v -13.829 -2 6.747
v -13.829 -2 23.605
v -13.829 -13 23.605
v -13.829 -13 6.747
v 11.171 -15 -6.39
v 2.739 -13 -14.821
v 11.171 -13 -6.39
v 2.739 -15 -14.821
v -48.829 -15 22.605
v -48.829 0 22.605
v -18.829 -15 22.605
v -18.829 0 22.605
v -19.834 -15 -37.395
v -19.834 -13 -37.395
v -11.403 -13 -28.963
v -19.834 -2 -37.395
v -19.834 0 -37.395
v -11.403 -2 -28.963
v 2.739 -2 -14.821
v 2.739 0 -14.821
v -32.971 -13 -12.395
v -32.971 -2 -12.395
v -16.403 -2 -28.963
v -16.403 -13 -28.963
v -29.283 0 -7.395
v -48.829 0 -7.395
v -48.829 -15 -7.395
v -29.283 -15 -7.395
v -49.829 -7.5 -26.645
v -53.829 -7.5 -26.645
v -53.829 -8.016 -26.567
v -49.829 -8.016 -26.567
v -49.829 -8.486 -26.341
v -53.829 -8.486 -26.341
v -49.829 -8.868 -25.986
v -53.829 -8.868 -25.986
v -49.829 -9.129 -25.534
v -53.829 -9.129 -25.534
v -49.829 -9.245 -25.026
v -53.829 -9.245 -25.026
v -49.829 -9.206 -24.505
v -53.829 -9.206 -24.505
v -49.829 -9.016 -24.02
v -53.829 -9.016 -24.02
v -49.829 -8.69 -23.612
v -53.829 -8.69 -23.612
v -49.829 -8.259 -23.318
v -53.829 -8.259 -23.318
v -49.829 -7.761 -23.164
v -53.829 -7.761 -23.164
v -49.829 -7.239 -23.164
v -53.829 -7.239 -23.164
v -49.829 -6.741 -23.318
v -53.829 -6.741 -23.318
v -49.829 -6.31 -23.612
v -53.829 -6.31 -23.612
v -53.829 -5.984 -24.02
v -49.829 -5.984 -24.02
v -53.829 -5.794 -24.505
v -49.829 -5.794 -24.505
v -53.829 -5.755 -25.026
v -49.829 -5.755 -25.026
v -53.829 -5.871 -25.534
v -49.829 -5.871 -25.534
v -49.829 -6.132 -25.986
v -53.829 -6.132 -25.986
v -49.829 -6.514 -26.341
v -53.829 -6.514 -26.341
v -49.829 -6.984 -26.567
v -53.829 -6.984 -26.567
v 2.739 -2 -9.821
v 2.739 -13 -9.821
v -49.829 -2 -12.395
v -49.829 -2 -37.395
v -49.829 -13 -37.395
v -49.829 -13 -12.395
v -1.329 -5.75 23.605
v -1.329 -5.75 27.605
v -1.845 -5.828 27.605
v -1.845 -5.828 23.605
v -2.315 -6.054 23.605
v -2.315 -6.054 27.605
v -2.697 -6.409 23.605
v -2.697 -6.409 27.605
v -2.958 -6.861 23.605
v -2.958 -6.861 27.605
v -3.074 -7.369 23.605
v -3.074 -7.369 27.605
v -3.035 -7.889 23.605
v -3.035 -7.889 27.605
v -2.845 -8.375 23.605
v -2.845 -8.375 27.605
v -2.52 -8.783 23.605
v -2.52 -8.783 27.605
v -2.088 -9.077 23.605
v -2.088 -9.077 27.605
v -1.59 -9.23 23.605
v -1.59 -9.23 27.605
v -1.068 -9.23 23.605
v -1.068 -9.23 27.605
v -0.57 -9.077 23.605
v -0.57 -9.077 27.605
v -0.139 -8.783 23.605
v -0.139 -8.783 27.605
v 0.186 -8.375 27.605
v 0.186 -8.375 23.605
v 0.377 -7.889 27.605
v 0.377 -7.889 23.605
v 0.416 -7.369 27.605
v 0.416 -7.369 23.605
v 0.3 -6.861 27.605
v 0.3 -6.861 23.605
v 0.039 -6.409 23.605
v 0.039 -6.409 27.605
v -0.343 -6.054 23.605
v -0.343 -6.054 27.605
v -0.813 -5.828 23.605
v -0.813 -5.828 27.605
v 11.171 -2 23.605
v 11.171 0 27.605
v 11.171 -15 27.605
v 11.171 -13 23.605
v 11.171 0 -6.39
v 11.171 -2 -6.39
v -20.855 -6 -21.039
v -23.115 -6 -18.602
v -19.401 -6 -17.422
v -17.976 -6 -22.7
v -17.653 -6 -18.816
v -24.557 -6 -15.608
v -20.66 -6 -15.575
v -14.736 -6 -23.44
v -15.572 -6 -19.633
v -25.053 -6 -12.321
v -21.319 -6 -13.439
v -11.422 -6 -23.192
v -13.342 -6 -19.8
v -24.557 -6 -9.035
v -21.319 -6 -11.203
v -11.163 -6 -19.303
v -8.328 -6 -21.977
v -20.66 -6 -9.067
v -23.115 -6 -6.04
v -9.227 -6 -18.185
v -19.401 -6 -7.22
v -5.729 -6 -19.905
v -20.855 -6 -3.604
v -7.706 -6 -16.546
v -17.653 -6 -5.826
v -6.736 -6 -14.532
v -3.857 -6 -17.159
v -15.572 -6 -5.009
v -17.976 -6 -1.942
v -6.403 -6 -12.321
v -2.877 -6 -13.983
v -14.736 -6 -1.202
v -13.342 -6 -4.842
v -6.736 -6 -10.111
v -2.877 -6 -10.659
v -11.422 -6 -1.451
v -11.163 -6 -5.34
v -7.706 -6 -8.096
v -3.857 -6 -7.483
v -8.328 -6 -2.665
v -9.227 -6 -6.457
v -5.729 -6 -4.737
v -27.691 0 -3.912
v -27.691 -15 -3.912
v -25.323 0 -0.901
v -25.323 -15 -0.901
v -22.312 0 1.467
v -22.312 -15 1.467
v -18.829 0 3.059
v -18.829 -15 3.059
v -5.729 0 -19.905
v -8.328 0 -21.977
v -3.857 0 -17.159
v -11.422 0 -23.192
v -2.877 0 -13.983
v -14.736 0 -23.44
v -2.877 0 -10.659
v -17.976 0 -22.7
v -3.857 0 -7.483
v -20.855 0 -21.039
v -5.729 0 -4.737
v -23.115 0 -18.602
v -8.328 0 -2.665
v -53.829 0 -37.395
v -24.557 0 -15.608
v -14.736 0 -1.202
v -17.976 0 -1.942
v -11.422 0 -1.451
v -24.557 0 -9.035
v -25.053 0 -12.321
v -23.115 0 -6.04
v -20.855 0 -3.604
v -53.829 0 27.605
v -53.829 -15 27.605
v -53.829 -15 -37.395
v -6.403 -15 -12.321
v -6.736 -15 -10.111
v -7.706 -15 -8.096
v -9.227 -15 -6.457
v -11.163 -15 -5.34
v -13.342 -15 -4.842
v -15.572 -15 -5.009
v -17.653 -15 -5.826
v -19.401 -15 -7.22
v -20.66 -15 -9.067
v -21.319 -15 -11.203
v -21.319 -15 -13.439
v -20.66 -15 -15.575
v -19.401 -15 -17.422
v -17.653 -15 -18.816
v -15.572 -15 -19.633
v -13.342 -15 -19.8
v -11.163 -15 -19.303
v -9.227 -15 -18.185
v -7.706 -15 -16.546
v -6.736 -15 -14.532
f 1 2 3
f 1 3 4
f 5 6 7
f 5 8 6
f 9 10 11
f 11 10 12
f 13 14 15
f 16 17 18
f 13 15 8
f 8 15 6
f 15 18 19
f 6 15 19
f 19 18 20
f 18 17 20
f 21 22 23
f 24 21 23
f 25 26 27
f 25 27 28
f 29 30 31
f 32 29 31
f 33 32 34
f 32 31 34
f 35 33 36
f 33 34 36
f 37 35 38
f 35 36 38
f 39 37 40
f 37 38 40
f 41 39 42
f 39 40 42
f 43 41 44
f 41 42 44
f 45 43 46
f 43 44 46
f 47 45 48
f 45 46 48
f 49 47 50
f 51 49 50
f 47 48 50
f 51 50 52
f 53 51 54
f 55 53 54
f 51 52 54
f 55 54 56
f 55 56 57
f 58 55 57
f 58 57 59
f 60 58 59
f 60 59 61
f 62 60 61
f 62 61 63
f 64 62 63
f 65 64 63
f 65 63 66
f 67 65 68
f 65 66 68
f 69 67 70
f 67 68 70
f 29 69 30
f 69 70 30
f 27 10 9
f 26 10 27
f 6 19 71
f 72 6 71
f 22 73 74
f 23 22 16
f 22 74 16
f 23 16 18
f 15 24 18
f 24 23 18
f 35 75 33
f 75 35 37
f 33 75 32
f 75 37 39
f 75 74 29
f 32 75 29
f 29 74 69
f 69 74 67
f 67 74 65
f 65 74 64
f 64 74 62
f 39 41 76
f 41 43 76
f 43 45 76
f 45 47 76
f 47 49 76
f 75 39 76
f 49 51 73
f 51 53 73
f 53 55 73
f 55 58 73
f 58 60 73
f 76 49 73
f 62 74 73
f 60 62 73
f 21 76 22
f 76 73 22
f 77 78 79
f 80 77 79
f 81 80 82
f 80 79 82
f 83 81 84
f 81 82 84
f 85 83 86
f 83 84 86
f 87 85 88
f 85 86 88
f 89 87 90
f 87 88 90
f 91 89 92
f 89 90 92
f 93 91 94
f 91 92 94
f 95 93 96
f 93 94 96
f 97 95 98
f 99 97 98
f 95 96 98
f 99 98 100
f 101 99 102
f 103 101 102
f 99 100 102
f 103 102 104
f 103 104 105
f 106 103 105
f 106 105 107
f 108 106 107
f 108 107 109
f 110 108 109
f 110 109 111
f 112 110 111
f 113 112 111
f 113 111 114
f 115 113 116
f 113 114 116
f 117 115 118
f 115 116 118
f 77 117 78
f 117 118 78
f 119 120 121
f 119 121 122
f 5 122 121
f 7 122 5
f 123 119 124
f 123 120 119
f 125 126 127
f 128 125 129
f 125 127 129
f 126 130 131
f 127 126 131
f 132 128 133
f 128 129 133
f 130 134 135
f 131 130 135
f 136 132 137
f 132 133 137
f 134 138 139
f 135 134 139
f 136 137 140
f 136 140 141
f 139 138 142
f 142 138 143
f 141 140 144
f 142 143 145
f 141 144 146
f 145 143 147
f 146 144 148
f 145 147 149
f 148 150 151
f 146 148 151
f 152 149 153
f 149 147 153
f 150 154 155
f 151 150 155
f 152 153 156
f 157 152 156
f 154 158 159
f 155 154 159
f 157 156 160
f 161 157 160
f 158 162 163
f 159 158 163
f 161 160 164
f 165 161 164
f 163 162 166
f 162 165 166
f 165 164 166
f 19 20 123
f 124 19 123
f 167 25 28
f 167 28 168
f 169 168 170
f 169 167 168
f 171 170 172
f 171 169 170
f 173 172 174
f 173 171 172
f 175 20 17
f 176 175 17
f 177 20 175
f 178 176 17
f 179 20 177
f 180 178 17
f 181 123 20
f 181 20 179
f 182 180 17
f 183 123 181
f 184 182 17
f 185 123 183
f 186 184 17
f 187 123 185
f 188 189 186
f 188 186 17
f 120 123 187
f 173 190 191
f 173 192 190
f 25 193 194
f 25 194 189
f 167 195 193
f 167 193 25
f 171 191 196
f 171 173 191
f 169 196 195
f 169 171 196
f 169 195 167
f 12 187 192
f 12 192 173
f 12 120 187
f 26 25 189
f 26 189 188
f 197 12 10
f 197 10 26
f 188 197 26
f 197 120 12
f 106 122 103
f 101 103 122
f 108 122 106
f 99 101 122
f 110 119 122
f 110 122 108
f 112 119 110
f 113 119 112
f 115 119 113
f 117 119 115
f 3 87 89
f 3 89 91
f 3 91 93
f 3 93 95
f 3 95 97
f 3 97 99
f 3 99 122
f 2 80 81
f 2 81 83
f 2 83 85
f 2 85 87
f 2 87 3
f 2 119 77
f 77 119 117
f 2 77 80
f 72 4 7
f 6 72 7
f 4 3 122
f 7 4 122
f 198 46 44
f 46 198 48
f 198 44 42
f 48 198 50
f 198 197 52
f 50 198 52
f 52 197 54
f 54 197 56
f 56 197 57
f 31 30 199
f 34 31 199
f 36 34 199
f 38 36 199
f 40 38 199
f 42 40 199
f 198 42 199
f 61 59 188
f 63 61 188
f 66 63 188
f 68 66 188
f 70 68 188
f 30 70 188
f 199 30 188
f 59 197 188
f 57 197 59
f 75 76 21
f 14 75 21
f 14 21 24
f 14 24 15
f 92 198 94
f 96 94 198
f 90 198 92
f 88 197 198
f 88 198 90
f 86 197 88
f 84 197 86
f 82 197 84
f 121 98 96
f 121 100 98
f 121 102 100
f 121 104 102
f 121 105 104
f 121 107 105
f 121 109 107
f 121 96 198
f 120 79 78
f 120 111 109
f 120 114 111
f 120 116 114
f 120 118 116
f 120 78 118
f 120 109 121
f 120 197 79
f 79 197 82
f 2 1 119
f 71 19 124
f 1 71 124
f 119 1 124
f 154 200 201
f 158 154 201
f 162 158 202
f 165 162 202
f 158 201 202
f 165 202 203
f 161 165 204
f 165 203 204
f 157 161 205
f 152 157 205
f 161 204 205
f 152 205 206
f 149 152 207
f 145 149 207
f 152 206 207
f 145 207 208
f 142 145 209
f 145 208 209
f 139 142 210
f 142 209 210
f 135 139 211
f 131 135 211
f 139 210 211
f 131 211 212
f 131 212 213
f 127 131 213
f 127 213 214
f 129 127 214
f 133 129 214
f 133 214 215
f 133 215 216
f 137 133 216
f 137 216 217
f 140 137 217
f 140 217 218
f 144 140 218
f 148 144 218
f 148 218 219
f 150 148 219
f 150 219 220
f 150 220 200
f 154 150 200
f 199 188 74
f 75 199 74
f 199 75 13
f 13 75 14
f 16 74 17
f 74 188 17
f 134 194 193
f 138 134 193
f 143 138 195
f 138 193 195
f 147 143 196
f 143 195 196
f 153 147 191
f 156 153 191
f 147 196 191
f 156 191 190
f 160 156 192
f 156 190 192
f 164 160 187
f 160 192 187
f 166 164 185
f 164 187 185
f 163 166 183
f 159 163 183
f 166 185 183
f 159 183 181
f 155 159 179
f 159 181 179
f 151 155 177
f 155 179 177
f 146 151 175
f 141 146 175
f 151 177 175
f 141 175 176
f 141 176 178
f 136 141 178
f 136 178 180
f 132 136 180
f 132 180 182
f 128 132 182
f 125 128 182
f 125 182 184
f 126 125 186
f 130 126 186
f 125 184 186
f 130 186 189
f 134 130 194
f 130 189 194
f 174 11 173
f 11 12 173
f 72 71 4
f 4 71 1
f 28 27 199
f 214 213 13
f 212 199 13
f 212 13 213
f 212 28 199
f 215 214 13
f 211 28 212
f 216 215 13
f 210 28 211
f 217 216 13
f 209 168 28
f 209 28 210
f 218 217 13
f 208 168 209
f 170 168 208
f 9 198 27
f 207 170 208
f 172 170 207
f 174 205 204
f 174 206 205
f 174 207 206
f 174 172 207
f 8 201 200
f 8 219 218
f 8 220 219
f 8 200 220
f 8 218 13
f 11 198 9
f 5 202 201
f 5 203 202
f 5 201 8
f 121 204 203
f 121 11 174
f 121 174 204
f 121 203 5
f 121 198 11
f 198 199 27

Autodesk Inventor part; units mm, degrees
ref_plane "YZ Plane" through (0, 0, 0) normal (1, 0, 0) x (0, 1, 0)
ref_plane "XZ Plane" through (0, 0, 0) normal (0, 1, 0) x (-1, 0, 0)
ref_plane "XY Plane" through (0, 0, 0) normal (0, 0, 1) x (1, 0, 0)
sketch "Sketch1" plane through (0, 0, 0) normal (0, 1, 0) x (-1, 0, 0)
  line L0 (49.6871, 42.6052) -> (39.6871, 32.6052) projected
  line L1 (53.8292, 42.6052) -> (49.6871, 42.6052) projected
  line L2 (53.8292, 27.6052) -> (53.8292, 42.6052) projected
  line L3 (68.8292, 27.6052) -> (53.8292, 27.6052) projected
  line L4 (68.8292, 23.4631) -> (68.8292, 27.6052) projected
  line L5 (58.8292, 13.4631) -> (68.8292, 23.4631) projected
  line L6 (53.8292, 13.4631) -> (58.8292, 13.4631) projected
  line L7 (39.6871, 27.6052) -> (53.8292, 13.4631) projected
  line L8 (39.6871, 32.6052) -> (39.6871, 27.6052) projected
  line L9 (58.8292, 13.4631) -> (53.8292, 13.4631) projected
  line L10 (58.8292, 13.4631) -> (16.4028, -28.9633) projected
  line L11 (16.4028, -28.9633) -> (11.4028, -28.9633) projected
  line L12 (11.4028, -28.9633) -> (-2.7393, -14.8212) projected
  line L13 (-2.7393, -14.8212) -> (-2.7393, -9.8212) projected
  line L14 (-2.7393, -9.8212) -> (39.6871, 32.6052) projected
  line L15 (39.6871, 27.6052) -> (39.6871, 32.6052) projected
  line L16 (53.8292, 13.4631) -> (39.6871, 27.6052) projected
  circle A0 centre (13.9028, -12.3212) radius 11.15 projected
  line L17 (53.8292, 27.6052) -> (53.8292, -37.3948)
  line L18 (53.8292, 27.6052) -> (-11.1708, 27.6052)
  line L19 (53.8292, -37.3948) -> (49.8292, -37.3948)
  line L20 (49.8292, -37.3948) -> (49.8292, -12.3948)
  line L21 (49.8292, -12.3948) -> (32.9714, -12.3948)
  line L22 (-11.1708, 27.6052) -> (-11.1708, 23.6052)
  line L23 (-11.1708, 23.6052) -> (13.8292, 23.6052)
  line L24 (13.8292, 23.6052) -> (13.8292, 6.7473)
  point P0 (0, 0)
  dimension "d5" = 65
  dimension "d6" = 4
  dimension "d7" = 25
extrude "Extrusion1" add sketch "Sketch1" against normal blind 15 contours L18 L17 L7 | L7 L17 L10 L11 L12 L13 L14 L18 | L14 L24 L23 L22 L18 | L17 L19 L20 L21 L10
sketch "Sketch2" plane through (0, -15, 0) normal (0, -1, 0) x (1, 0, 0)
  circle A0 centre (-13.9028, -12.3212) radius 11.15 projected
  circle A1 centre (-13.9028, -12.3212) radius 7.5
  point P0 (0, 0)
  dimension "d2" = 15
extrude "Extrusion2" add sketch "Sketch2" against normal blind 9
sketch "Sketch3" plane through (0, 0, 0) normal (0, 1, 0) x (1, 0, 0)
  line L0 (2.7393, 14.8212) -> (-11.4028, 28.9633) projected
  line L1 (-11.4028, 28.9633) -> (-16.4028, 28.9633) projected
  line L2 (-16.4028, 28.9633) -> (-32.9714, 12.3948) projected
  line L3 (-32.9714, 12.3948) -> (-49.8292, 12.3948) projected
  line L4 (-49.8292, 12.3948) -> (-49.8292, 37.3948) projected
  line L5 (-49.8292, 37.3948) -> (-53.8292, 37.3948) projected
  line L6 (-53.8292, 37.3948) -> (-53.8292, -27.6052) projected
  line L7 (-53.8292, -27.6052) -> (11.1708, -27.6052) projected
  line L8 (11.1708, -27.6052) -> (11.1708, -23.6052) projected
  line L9 (11.1708, -23.6052) -> (-13.8292, -23.6052) projected
  line L10 (-13.8292, -23.6052) -> (-13.8292, -6.7473) projected
  line L11 (-13.8292, -6.7473) -> (2.7393, 9.8212) projected
  line L12 (2.7393, 9.8212) -> (2.7393, 14.8212) projected
  circle A0 centre (-13.9028, 12.3212) radius 11.15 projected
  line L13 (2.7393, 14.8212) -> (11.1708, 6.3898)
  line L14 (11.1708, 6.3898) -> (11.1708, -23.6052)
  line L15 (-11.4028, 28.9633) -> (-19.8343, 37.3948)
  line L16 (-19.8343, 37.3948) -> (-49.8292, 37.3948)
  line L17 (-11.4028, 28.9633) -> (-16.4028, 28.9633) projected
  point P0 (0, 0)
extrude "Extrusion3" add sketch "Sketch3" against normal blind 2 contours L13 L14 L9 L10 L11 L12 | L1 L2 L3 L4 L16 L15
sketch "Sketch4" plane through (0, -15, 0) normal (0, -1, 0) x (1, 0, 0)
  line L0 (2.7393, -9.8212) -> (-13.8292, 6.7473) projected
  line L1 (2.7393, -14.8212) -> (2.7393, -9.8212) projected
  line L2 (2.7393, -14.8212) -> (11.1708, -6.3898) projected
  line L3 (11.1708, -6.3898) -> (11.1708, 23.6052) projected
  line L4 (-13.8292, 23.6052) -> (11.1708, 23.6052) projected
  line L5 (-13.8292, 6.7473) -> (-13.8292, 23.6052) projected
  line L6 (-49.8292, -37.3948) -> (-19.8343, -37.3948) projected
  line L7 (-19.8343, -37.3948) -> (-11.4028, -28.9633) projected
  line L8 (-16.4028, -28.9633) -> (-11.4028, -28.9633) projected
  line L9 (-32.9714, -12.3948) -> (-16.4028, -28.9633) projected
  line L10 (-49.8292, -12.3948) -> (-32.9714, -12.3948) projected
  line L11 (-49.8292, -37.3948) -> (-49.8292, -12.3948) projected
  point P0 (0, 0)
extrude "Extrusion4" add sketch "Sketch4" against normal blind 2
sketch "Sketch5" plane through (11.1708, -2, 23.6052) normal (0, 0, -1) x (-1, 0, 0)
  line L0 (0, -11) -> (25, -11) projected
  line L1 (25, 0) -> (25, -11) projected
  line L2 (25, 0) -> (0, 0) projected
  line L3 (0, 0) -> (0, -11) projected
  point P0 (11.1708, 2)
  point P1 (12.5, -5.5)
  point P2 (0, -5.5)
  point P3 (12.5, 0)
hole "Hole1" at (-1.3292, -7.5, 23.6052) direction (0, 0, 1) diameter 3.5 end through all
sketch "Sketch6" plane through (-49.8292, -2, -12.3948) normal (1, 0, 0) x (0, 0, -1)
  line L0 (0, -11) -> (25, -11) projected
  line L1 (25, 0) -> (25, -11) projected
  line L2 (25, 0) -> (0, 0) projected
  line L3 (0, 0) -> (0, -11) projected
  point P0 (-12.3948, 2)
  point P1 (12.5, -5.5)
  point P2 (25, -5.5)
  point P3 (12.5, 0)
hole "Hole2" at (-49.8292, -7.5, -24.8948) direction (-1, 0, 0) diameter 3.5 end through all
sketch "Sketch7" plane through (0, 0, 0) normal (0, 1, 0) x (1, 0, 0)
  line L0 (11.1708, 6.3898) -> (-19.8343, 37.3948) projected
  line L1 (-19.8343, 37.3948) -> (-53.8292, 37.3948) projected
  line L2 (-53.8292, 37.3948) -> (-53.8292, -27.6052) projected
  line L3 (-53.8292, -27.6052) -> (11.1708, -27.6052) projected
  line L4 (11.1708, -27.6052) -> (11.1708, 6.3898) projected
  circle A0 centre (-13.9028, 12.3212) radius 11.15 projected
  line L5 (-48.8292, -22.6052) -> (-48.8292, 7.3948)
  circle A1 centre (-13.9028, 12.3212) radius 16.15
  line L6 (-48.8292, -22.6052) -> (-18.8292, -22.6052)
  line L7 (-18.8292, -22.6052) -> (-18.8292, -3.0591)
  line L8 (-48.8292, 7.3948) -> (-29.2831, 7.3948)
  point P0 (0, 0)
  dimension "d26" = 5
  dimension "d27" = 5
  dimension "d28" = 5
  dimension "d31" = 30
extrude "Extrusion5" cut sketch "Sketch7" against normal through all contours A1 L7 L6 L5 L8
equation "\"d27\" = d28"
properties part number "Z Axis Bottom Bearing Holder" material "ABS Plastic"
